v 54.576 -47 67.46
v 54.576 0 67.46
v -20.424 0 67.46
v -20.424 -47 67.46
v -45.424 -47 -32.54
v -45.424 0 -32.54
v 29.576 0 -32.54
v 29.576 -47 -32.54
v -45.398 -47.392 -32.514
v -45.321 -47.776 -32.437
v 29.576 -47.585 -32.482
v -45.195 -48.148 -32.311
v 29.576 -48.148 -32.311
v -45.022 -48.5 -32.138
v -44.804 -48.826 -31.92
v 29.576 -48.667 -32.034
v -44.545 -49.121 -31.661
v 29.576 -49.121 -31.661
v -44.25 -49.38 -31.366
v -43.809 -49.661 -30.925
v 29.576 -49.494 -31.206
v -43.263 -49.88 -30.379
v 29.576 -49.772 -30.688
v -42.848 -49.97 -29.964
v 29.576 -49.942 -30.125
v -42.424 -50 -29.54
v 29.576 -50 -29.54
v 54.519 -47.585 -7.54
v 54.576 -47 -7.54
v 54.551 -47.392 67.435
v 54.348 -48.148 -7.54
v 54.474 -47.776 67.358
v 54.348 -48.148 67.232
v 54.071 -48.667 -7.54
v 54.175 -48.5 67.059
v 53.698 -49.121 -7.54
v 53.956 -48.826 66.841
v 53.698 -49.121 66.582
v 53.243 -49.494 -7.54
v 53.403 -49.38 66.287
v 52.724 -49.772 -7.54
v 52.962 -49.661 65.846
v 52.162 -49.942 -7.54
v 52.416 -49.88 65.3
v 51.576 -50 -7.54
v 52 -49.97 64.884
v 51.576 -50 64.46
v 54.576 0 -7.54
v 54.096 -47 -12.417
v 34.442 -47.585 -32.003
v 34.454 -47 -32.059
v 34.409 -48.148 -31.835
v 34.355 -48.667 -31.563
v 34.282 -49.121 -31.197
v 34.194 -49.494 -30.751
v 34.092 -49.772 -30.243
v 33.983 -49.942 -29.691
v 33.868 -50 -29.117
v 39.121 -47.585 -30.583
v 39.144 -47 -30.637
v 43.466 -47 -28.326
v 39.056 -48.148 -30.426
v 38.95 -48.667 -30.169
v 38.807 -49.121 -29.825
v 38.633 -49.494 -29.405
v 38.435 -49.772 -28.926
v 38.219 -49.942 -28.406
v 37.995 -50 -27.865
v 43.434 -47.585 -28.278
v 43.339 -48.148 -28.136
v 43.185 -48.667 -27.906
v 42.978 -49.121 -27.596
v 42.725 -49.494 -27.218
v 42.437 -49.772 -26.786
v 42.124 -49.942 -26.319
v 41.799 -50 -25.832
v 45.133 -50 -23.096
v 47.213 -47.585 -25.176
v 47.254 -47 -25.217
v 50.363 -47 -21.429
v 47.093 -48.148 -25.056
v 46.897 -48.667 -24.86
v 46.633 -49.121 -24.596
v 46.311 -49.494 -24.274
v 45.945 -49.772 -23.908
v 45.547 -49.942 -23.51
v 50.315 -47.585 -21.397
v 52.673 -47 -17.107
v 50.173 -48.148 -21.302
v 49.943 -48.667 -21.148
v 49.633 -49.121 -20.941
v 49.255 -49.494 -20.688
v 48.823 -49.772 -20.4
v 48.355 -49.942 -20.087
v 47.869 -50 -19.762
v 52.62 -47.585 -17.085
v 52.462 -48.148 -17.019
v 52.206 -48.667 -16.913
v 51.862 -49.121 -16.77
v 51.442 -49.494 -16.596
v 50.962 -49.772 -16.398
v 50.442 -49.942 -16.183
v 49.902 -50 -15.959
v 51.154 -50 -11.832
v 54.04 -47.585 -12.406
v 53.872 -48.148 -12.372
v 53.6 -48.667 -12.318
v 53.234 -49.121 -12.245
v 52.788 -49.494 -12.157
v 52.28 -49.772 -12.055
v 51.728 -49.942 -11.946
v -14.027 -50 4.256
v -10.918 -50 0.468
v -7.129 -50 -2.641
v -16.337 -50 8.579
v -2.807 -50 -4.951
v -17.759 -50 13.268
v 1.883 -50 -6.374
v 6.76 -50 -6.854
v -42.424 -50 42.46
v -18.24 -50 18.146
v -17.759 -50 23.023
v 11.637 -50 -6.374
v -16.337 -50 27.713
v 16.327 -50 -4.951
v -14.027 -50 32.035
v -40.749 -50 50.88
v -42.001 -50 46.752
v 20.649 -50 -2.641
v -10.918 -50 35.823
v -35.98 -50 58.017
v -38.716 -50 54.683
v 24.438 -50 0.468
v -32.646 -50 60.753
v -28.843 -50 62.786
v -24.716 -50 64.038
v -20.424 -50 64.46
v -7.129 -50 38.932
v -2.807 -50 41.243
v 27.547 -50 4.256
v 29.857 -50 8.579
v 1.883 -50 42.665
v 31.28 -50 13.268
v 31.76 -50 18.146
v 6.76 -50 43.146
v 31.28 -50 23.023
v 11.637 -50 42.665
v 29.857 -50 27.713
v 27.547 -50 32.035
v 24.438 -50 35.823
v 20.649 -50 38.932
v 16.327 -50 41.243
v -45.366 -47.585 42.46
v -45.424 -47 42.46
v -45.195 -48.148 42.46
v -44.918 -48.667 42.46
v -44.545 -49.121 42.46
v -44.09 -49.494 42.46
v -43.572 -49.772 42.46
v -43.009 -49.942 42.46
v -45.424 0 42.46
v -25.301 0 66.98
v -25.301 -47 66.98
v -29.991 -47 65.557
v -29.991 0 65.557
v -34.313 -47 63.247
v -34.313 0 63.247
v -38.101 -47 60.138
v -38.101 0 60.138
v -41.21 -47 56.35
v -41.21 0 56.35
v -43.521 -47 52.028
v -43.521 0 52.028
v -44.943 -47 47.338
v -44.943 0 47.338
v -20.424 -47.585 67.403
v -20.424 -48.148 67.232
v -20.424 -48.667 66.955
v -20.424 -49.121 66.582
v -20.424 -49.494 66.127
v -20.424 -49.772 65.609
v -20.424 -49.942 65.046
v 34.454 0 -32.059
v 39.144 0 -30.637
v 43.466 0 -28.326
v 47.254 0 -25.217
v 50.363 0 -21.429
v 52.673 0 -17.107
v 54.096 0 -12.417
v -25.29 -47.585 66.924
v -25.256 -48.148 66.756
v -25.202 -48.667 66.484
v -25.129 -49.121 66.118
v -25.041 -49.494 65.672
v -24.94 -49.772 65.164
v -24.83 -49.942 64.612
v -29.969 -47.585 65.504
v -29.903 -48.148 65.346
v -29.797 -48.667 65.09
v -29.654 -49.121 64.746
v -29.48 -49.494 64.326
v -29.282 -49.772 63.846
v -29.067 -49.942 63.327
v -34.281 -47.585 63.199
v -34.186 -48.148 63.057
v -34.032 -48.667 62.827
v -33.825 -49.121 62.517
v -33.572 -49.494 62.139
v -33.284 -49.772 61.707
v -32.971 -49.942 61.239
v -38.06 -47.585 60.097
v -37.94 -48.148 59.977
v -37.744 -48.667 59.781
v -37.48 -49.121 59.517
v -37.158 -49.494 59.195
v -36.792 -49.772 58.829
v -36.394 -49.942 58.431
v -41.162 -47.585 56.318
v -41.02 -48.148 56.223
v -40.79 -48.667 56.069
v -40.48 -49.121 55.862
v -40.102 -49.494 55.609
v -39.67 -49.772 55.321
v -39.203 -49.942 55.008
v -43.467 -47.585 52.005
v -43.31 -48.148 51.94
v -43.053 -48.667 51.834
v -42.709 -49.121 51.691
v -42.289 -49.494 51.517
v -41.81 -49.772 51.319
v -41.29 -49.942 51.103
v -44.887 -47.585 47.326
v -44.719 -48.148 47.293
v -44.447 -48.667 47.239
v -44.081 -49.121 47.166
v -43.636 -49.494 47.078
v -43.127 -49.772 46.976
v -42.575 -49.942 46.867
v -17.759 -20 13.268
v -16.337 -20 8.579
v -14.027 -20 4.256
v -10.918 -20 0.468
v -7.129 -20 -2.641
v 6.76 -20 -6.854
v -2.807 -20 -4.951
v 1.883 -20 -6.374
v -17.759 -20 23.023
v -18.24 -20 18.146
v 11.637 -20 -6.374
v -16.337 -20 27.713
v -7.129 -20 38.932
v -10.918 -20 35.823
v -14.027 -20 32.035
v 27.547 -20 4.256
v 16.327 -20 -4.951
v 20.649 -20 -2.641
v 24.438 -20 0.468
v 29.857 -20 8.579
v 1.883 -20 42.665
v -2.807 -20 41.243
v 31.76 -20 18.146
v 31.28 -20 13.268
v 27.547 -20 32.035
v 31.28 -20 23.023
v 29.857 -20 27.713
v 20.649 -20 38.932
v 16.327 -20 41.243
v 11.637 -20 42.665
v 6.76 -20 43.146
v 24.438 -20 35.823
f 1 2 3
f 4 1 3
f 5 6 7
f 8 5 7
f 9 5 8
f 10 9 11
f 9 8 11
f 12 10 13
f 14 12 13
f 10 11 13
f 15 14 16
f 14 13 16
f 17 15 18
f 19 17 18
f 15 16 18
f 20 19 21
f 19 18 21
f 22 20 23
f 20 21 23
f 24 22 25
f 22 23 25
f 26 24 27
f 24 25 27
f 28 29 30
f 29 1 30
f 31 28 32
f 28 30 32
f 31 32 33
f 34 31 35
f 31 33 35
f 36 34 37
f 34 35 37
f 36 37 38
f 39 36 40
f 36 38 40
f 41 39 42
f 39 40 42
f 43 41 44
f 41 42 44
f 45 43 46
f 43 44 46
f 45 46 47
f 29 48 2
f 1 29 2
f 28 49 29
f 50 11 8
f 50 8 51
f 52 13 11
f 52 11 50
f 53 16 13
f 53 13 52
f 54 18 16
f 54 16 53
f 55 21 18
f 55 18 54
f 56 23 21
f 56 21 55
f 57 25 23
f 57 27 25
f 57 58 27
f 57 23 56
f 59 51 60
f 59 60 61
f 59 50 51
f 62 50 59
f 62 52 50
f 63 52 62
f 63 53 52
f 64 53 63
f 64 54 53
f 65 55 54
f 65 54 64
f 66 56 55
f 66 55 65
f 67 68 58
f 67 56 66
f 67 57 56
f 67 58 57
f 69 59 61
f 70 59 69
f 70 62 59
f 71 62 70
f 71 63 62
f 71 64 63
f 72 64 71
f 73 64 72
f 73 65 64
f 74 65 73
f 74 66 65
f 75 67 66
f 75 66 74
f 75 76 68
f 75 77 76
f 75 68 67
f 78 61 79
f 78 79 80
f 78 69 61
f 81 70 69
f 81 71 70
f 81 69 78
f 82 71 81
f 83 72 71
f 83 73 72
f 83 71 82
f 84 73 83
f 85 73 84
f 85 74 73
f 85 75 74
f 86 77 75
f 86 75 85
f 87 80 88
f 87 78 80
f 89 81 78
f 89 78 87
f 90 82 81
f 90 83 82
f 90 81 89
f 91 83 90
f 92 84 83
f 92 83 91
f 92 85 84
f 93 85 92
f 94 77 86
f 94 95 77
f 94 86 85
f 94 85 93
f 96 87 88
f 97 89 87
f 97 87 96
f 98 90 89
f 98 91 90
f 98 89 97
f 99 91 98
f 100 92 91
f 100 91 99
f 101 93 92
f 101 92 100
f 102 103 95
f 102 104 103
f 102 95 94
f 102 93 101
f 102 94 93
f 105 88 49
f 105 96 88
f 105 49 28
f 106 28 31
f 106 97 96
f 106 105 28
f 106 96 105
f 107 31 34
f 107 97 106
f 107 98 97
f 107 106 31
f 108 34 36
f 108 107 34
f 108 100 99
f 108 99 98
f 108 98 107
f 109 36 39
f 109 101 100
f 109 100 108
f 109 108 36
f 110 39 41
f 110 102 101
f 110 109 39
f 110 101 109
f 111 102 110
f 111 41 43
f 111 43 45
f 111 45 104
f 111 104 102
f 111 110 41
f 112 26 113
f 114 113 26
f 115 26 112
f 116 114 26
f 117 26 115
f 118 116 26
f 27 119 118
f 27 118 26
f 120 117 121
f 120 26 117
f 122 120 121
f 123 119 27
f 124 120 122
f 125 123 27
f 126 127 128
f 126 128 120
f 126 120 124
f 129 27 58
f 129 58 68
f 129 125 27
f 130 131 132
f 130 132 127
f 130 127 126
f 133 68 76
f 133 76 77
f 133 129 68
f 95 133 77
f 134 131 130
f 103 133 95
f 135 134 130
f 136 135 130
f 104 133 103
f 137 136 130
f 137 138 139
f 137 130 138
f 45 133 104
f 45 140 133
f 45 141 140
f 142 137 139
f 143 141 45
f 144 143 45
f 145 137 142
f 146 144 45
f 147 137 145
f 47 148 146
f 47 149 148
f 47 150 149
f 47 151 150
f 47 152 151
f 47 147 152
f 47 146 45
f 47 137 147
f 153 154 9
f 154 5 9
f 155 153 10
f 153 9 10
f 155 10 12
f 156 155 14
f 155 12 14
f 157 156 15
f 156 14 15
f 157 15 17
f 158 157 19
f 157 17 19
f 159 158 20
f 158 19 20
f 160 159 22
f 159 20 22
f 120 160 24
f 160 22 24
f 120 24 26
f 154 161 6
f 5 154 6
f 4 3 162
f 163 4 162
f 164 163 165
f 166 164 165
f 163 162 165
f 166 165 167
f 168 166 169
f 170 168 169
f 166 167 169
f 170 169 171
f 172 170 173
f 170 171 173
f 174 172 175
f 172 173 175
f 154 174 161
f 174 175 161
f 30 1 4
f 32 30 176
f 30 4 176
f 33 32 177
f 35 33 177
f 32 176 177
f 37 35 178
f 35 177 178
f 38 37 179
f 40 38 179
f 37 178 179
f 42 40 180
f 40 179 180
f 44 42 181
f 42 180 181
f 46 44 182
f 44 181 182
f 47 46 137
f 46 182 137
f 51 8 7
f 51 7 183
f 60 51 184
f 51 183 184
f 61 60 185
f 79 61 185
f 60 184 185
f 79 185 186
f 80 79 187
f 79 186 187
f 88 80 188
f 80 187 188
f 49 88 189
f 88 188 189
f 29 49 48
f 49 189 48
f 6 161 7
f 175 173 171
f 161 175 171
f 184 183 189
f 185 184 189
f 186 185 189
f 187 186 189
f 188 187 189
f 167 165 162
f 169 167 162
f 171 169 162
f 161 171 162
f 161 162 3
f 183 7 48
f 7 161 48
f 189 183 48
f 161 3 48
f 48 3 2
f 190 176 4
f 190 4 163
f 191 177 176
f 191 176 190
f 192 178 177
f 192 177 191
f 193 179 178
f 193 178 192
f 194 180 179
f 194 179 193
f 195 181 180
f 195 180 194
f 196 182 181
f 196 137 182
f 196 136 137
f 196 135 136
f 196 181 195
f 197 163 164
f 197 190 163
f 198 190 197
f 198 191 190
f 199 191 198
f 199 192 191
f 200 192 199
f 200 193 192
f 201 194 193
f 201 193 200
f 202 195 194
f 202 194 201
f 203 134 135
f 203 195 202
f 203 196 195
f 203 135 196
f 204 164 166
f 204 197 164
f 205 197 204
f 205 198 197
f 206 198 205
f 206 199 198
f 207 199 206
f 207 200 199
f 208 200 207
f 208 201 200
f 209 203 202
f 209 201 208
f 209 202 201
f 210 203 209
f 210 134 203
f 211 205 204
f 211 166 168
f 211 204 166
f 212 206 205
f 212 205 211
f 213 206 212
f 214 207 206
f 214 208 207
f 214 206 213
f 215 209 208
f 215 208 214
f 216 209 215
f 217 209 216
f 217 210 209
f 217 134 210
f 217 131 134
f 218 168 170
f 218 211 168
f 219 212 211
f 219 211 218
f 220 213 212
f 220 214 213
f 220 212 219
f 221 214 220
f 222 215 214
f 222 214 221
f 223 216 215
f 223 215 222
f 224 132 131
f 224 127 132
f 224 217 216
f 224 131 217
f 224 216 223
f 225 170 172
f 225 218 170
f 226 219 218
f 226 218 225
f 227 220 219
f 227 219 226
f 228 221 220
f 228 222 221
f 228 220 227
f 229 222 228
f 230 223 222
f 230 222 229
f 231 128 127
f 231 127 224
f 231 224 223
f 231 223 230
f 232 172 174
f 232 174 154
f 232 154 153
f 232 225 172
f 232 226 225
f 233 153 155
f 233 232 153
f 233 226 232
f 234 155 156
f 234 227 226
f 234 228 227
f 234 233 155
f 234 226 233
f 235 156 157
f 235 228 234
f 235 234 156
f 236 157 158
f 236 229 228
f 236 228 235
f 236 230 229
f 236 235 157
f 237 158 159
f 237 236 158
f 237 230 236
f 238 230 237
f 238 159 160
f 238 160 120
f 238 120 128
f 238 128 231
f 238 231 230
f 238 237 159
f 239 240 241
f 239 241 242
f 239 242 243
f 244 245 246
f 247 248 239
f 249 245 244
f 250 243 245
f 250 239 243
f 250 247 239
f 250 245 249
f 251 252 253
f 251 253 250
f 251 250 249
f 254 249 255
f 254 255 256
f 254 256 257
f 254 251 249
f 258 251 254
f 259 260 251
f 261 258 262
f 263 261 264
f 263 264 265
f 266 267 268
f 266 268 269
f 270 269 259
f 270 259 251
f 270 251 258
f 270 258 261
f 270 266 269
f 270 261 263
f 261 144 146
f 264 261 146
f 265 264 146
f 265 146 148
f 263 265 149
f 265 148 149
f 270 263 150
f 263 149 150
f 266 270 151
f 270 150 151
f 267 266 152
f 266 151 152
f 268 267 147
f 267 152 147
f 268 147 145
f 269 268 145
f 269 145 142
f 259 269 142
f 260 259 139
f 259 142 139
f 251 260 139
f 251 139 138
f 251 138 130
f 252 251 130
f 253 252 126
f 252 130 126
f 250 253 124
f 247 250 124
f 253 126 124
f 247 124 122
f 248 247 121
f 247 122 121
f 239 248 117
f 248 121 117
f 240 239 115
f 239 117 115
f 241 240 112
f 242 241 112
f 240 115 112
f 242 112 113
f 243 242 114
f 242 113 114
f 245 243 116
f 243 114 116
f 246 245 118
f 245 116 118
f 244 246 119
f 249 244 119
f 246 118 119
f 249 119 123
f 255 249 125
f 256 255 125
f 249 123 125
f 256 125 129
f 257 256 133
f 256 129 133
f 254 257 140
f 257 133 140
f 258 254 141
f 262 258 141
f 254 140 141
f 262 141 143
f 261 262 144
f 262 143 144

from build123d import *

# Parameters (mm, degrees)
F1_DEPTH = 50
F2_R     = 3
F3_R     = 25
F4_DEPTH = 30


with BuildPart() as f1:
    # F0 (on Front) → F1 (new body)
    with BuildSketch(Plane.XZ):
        with BuildLine():
            Line((54.576429, 67.460465), (-20.423571, 67.460465))
            ThreePointArc((-20.423571, 67.460465), (-38.101241, 60.138135), (-45.423571, 42.460465))
            Line((-45.423571, 42.460465), (-45.423571, -32.539535))
            Line((-45.423571, -32.539535), (29.576429, -32.539535))
            ThreePointArc((29.576429, -32.539535), (47.254099, -25.217204), (54.576429, -7.539535))
            Line((54.576429, -7.539535), (54.576429, 67.460465))
        make_face()
    extrude(amount=F1_DEPTH)

    # F2
    f2_edges = [f1.edges().sort_by_distance(p)[0] for p in [
        (17.076429, -50, 67.460465),
        (-38.101241, -50, 60.138135),
        (-45.423571, -50, 4.960465),
        (-7.923571, -50, -32.539535),
        (47.254099, -50, -25.217204),
        (54.576429, -50, 29.960465),
    ]]
    fillet(f2_edges, radius=F2_R)

    # F3 (on face) → F4 (cut)
    with BuildSketch(Plane.XZ.offset(50)):
        with Locations((6.760165, 18.145708)):
            Circle(F3_R)
    extrude(amount=-F4_DEPTH, mode=Mode.SUBTRACT)


solid = f1.part
